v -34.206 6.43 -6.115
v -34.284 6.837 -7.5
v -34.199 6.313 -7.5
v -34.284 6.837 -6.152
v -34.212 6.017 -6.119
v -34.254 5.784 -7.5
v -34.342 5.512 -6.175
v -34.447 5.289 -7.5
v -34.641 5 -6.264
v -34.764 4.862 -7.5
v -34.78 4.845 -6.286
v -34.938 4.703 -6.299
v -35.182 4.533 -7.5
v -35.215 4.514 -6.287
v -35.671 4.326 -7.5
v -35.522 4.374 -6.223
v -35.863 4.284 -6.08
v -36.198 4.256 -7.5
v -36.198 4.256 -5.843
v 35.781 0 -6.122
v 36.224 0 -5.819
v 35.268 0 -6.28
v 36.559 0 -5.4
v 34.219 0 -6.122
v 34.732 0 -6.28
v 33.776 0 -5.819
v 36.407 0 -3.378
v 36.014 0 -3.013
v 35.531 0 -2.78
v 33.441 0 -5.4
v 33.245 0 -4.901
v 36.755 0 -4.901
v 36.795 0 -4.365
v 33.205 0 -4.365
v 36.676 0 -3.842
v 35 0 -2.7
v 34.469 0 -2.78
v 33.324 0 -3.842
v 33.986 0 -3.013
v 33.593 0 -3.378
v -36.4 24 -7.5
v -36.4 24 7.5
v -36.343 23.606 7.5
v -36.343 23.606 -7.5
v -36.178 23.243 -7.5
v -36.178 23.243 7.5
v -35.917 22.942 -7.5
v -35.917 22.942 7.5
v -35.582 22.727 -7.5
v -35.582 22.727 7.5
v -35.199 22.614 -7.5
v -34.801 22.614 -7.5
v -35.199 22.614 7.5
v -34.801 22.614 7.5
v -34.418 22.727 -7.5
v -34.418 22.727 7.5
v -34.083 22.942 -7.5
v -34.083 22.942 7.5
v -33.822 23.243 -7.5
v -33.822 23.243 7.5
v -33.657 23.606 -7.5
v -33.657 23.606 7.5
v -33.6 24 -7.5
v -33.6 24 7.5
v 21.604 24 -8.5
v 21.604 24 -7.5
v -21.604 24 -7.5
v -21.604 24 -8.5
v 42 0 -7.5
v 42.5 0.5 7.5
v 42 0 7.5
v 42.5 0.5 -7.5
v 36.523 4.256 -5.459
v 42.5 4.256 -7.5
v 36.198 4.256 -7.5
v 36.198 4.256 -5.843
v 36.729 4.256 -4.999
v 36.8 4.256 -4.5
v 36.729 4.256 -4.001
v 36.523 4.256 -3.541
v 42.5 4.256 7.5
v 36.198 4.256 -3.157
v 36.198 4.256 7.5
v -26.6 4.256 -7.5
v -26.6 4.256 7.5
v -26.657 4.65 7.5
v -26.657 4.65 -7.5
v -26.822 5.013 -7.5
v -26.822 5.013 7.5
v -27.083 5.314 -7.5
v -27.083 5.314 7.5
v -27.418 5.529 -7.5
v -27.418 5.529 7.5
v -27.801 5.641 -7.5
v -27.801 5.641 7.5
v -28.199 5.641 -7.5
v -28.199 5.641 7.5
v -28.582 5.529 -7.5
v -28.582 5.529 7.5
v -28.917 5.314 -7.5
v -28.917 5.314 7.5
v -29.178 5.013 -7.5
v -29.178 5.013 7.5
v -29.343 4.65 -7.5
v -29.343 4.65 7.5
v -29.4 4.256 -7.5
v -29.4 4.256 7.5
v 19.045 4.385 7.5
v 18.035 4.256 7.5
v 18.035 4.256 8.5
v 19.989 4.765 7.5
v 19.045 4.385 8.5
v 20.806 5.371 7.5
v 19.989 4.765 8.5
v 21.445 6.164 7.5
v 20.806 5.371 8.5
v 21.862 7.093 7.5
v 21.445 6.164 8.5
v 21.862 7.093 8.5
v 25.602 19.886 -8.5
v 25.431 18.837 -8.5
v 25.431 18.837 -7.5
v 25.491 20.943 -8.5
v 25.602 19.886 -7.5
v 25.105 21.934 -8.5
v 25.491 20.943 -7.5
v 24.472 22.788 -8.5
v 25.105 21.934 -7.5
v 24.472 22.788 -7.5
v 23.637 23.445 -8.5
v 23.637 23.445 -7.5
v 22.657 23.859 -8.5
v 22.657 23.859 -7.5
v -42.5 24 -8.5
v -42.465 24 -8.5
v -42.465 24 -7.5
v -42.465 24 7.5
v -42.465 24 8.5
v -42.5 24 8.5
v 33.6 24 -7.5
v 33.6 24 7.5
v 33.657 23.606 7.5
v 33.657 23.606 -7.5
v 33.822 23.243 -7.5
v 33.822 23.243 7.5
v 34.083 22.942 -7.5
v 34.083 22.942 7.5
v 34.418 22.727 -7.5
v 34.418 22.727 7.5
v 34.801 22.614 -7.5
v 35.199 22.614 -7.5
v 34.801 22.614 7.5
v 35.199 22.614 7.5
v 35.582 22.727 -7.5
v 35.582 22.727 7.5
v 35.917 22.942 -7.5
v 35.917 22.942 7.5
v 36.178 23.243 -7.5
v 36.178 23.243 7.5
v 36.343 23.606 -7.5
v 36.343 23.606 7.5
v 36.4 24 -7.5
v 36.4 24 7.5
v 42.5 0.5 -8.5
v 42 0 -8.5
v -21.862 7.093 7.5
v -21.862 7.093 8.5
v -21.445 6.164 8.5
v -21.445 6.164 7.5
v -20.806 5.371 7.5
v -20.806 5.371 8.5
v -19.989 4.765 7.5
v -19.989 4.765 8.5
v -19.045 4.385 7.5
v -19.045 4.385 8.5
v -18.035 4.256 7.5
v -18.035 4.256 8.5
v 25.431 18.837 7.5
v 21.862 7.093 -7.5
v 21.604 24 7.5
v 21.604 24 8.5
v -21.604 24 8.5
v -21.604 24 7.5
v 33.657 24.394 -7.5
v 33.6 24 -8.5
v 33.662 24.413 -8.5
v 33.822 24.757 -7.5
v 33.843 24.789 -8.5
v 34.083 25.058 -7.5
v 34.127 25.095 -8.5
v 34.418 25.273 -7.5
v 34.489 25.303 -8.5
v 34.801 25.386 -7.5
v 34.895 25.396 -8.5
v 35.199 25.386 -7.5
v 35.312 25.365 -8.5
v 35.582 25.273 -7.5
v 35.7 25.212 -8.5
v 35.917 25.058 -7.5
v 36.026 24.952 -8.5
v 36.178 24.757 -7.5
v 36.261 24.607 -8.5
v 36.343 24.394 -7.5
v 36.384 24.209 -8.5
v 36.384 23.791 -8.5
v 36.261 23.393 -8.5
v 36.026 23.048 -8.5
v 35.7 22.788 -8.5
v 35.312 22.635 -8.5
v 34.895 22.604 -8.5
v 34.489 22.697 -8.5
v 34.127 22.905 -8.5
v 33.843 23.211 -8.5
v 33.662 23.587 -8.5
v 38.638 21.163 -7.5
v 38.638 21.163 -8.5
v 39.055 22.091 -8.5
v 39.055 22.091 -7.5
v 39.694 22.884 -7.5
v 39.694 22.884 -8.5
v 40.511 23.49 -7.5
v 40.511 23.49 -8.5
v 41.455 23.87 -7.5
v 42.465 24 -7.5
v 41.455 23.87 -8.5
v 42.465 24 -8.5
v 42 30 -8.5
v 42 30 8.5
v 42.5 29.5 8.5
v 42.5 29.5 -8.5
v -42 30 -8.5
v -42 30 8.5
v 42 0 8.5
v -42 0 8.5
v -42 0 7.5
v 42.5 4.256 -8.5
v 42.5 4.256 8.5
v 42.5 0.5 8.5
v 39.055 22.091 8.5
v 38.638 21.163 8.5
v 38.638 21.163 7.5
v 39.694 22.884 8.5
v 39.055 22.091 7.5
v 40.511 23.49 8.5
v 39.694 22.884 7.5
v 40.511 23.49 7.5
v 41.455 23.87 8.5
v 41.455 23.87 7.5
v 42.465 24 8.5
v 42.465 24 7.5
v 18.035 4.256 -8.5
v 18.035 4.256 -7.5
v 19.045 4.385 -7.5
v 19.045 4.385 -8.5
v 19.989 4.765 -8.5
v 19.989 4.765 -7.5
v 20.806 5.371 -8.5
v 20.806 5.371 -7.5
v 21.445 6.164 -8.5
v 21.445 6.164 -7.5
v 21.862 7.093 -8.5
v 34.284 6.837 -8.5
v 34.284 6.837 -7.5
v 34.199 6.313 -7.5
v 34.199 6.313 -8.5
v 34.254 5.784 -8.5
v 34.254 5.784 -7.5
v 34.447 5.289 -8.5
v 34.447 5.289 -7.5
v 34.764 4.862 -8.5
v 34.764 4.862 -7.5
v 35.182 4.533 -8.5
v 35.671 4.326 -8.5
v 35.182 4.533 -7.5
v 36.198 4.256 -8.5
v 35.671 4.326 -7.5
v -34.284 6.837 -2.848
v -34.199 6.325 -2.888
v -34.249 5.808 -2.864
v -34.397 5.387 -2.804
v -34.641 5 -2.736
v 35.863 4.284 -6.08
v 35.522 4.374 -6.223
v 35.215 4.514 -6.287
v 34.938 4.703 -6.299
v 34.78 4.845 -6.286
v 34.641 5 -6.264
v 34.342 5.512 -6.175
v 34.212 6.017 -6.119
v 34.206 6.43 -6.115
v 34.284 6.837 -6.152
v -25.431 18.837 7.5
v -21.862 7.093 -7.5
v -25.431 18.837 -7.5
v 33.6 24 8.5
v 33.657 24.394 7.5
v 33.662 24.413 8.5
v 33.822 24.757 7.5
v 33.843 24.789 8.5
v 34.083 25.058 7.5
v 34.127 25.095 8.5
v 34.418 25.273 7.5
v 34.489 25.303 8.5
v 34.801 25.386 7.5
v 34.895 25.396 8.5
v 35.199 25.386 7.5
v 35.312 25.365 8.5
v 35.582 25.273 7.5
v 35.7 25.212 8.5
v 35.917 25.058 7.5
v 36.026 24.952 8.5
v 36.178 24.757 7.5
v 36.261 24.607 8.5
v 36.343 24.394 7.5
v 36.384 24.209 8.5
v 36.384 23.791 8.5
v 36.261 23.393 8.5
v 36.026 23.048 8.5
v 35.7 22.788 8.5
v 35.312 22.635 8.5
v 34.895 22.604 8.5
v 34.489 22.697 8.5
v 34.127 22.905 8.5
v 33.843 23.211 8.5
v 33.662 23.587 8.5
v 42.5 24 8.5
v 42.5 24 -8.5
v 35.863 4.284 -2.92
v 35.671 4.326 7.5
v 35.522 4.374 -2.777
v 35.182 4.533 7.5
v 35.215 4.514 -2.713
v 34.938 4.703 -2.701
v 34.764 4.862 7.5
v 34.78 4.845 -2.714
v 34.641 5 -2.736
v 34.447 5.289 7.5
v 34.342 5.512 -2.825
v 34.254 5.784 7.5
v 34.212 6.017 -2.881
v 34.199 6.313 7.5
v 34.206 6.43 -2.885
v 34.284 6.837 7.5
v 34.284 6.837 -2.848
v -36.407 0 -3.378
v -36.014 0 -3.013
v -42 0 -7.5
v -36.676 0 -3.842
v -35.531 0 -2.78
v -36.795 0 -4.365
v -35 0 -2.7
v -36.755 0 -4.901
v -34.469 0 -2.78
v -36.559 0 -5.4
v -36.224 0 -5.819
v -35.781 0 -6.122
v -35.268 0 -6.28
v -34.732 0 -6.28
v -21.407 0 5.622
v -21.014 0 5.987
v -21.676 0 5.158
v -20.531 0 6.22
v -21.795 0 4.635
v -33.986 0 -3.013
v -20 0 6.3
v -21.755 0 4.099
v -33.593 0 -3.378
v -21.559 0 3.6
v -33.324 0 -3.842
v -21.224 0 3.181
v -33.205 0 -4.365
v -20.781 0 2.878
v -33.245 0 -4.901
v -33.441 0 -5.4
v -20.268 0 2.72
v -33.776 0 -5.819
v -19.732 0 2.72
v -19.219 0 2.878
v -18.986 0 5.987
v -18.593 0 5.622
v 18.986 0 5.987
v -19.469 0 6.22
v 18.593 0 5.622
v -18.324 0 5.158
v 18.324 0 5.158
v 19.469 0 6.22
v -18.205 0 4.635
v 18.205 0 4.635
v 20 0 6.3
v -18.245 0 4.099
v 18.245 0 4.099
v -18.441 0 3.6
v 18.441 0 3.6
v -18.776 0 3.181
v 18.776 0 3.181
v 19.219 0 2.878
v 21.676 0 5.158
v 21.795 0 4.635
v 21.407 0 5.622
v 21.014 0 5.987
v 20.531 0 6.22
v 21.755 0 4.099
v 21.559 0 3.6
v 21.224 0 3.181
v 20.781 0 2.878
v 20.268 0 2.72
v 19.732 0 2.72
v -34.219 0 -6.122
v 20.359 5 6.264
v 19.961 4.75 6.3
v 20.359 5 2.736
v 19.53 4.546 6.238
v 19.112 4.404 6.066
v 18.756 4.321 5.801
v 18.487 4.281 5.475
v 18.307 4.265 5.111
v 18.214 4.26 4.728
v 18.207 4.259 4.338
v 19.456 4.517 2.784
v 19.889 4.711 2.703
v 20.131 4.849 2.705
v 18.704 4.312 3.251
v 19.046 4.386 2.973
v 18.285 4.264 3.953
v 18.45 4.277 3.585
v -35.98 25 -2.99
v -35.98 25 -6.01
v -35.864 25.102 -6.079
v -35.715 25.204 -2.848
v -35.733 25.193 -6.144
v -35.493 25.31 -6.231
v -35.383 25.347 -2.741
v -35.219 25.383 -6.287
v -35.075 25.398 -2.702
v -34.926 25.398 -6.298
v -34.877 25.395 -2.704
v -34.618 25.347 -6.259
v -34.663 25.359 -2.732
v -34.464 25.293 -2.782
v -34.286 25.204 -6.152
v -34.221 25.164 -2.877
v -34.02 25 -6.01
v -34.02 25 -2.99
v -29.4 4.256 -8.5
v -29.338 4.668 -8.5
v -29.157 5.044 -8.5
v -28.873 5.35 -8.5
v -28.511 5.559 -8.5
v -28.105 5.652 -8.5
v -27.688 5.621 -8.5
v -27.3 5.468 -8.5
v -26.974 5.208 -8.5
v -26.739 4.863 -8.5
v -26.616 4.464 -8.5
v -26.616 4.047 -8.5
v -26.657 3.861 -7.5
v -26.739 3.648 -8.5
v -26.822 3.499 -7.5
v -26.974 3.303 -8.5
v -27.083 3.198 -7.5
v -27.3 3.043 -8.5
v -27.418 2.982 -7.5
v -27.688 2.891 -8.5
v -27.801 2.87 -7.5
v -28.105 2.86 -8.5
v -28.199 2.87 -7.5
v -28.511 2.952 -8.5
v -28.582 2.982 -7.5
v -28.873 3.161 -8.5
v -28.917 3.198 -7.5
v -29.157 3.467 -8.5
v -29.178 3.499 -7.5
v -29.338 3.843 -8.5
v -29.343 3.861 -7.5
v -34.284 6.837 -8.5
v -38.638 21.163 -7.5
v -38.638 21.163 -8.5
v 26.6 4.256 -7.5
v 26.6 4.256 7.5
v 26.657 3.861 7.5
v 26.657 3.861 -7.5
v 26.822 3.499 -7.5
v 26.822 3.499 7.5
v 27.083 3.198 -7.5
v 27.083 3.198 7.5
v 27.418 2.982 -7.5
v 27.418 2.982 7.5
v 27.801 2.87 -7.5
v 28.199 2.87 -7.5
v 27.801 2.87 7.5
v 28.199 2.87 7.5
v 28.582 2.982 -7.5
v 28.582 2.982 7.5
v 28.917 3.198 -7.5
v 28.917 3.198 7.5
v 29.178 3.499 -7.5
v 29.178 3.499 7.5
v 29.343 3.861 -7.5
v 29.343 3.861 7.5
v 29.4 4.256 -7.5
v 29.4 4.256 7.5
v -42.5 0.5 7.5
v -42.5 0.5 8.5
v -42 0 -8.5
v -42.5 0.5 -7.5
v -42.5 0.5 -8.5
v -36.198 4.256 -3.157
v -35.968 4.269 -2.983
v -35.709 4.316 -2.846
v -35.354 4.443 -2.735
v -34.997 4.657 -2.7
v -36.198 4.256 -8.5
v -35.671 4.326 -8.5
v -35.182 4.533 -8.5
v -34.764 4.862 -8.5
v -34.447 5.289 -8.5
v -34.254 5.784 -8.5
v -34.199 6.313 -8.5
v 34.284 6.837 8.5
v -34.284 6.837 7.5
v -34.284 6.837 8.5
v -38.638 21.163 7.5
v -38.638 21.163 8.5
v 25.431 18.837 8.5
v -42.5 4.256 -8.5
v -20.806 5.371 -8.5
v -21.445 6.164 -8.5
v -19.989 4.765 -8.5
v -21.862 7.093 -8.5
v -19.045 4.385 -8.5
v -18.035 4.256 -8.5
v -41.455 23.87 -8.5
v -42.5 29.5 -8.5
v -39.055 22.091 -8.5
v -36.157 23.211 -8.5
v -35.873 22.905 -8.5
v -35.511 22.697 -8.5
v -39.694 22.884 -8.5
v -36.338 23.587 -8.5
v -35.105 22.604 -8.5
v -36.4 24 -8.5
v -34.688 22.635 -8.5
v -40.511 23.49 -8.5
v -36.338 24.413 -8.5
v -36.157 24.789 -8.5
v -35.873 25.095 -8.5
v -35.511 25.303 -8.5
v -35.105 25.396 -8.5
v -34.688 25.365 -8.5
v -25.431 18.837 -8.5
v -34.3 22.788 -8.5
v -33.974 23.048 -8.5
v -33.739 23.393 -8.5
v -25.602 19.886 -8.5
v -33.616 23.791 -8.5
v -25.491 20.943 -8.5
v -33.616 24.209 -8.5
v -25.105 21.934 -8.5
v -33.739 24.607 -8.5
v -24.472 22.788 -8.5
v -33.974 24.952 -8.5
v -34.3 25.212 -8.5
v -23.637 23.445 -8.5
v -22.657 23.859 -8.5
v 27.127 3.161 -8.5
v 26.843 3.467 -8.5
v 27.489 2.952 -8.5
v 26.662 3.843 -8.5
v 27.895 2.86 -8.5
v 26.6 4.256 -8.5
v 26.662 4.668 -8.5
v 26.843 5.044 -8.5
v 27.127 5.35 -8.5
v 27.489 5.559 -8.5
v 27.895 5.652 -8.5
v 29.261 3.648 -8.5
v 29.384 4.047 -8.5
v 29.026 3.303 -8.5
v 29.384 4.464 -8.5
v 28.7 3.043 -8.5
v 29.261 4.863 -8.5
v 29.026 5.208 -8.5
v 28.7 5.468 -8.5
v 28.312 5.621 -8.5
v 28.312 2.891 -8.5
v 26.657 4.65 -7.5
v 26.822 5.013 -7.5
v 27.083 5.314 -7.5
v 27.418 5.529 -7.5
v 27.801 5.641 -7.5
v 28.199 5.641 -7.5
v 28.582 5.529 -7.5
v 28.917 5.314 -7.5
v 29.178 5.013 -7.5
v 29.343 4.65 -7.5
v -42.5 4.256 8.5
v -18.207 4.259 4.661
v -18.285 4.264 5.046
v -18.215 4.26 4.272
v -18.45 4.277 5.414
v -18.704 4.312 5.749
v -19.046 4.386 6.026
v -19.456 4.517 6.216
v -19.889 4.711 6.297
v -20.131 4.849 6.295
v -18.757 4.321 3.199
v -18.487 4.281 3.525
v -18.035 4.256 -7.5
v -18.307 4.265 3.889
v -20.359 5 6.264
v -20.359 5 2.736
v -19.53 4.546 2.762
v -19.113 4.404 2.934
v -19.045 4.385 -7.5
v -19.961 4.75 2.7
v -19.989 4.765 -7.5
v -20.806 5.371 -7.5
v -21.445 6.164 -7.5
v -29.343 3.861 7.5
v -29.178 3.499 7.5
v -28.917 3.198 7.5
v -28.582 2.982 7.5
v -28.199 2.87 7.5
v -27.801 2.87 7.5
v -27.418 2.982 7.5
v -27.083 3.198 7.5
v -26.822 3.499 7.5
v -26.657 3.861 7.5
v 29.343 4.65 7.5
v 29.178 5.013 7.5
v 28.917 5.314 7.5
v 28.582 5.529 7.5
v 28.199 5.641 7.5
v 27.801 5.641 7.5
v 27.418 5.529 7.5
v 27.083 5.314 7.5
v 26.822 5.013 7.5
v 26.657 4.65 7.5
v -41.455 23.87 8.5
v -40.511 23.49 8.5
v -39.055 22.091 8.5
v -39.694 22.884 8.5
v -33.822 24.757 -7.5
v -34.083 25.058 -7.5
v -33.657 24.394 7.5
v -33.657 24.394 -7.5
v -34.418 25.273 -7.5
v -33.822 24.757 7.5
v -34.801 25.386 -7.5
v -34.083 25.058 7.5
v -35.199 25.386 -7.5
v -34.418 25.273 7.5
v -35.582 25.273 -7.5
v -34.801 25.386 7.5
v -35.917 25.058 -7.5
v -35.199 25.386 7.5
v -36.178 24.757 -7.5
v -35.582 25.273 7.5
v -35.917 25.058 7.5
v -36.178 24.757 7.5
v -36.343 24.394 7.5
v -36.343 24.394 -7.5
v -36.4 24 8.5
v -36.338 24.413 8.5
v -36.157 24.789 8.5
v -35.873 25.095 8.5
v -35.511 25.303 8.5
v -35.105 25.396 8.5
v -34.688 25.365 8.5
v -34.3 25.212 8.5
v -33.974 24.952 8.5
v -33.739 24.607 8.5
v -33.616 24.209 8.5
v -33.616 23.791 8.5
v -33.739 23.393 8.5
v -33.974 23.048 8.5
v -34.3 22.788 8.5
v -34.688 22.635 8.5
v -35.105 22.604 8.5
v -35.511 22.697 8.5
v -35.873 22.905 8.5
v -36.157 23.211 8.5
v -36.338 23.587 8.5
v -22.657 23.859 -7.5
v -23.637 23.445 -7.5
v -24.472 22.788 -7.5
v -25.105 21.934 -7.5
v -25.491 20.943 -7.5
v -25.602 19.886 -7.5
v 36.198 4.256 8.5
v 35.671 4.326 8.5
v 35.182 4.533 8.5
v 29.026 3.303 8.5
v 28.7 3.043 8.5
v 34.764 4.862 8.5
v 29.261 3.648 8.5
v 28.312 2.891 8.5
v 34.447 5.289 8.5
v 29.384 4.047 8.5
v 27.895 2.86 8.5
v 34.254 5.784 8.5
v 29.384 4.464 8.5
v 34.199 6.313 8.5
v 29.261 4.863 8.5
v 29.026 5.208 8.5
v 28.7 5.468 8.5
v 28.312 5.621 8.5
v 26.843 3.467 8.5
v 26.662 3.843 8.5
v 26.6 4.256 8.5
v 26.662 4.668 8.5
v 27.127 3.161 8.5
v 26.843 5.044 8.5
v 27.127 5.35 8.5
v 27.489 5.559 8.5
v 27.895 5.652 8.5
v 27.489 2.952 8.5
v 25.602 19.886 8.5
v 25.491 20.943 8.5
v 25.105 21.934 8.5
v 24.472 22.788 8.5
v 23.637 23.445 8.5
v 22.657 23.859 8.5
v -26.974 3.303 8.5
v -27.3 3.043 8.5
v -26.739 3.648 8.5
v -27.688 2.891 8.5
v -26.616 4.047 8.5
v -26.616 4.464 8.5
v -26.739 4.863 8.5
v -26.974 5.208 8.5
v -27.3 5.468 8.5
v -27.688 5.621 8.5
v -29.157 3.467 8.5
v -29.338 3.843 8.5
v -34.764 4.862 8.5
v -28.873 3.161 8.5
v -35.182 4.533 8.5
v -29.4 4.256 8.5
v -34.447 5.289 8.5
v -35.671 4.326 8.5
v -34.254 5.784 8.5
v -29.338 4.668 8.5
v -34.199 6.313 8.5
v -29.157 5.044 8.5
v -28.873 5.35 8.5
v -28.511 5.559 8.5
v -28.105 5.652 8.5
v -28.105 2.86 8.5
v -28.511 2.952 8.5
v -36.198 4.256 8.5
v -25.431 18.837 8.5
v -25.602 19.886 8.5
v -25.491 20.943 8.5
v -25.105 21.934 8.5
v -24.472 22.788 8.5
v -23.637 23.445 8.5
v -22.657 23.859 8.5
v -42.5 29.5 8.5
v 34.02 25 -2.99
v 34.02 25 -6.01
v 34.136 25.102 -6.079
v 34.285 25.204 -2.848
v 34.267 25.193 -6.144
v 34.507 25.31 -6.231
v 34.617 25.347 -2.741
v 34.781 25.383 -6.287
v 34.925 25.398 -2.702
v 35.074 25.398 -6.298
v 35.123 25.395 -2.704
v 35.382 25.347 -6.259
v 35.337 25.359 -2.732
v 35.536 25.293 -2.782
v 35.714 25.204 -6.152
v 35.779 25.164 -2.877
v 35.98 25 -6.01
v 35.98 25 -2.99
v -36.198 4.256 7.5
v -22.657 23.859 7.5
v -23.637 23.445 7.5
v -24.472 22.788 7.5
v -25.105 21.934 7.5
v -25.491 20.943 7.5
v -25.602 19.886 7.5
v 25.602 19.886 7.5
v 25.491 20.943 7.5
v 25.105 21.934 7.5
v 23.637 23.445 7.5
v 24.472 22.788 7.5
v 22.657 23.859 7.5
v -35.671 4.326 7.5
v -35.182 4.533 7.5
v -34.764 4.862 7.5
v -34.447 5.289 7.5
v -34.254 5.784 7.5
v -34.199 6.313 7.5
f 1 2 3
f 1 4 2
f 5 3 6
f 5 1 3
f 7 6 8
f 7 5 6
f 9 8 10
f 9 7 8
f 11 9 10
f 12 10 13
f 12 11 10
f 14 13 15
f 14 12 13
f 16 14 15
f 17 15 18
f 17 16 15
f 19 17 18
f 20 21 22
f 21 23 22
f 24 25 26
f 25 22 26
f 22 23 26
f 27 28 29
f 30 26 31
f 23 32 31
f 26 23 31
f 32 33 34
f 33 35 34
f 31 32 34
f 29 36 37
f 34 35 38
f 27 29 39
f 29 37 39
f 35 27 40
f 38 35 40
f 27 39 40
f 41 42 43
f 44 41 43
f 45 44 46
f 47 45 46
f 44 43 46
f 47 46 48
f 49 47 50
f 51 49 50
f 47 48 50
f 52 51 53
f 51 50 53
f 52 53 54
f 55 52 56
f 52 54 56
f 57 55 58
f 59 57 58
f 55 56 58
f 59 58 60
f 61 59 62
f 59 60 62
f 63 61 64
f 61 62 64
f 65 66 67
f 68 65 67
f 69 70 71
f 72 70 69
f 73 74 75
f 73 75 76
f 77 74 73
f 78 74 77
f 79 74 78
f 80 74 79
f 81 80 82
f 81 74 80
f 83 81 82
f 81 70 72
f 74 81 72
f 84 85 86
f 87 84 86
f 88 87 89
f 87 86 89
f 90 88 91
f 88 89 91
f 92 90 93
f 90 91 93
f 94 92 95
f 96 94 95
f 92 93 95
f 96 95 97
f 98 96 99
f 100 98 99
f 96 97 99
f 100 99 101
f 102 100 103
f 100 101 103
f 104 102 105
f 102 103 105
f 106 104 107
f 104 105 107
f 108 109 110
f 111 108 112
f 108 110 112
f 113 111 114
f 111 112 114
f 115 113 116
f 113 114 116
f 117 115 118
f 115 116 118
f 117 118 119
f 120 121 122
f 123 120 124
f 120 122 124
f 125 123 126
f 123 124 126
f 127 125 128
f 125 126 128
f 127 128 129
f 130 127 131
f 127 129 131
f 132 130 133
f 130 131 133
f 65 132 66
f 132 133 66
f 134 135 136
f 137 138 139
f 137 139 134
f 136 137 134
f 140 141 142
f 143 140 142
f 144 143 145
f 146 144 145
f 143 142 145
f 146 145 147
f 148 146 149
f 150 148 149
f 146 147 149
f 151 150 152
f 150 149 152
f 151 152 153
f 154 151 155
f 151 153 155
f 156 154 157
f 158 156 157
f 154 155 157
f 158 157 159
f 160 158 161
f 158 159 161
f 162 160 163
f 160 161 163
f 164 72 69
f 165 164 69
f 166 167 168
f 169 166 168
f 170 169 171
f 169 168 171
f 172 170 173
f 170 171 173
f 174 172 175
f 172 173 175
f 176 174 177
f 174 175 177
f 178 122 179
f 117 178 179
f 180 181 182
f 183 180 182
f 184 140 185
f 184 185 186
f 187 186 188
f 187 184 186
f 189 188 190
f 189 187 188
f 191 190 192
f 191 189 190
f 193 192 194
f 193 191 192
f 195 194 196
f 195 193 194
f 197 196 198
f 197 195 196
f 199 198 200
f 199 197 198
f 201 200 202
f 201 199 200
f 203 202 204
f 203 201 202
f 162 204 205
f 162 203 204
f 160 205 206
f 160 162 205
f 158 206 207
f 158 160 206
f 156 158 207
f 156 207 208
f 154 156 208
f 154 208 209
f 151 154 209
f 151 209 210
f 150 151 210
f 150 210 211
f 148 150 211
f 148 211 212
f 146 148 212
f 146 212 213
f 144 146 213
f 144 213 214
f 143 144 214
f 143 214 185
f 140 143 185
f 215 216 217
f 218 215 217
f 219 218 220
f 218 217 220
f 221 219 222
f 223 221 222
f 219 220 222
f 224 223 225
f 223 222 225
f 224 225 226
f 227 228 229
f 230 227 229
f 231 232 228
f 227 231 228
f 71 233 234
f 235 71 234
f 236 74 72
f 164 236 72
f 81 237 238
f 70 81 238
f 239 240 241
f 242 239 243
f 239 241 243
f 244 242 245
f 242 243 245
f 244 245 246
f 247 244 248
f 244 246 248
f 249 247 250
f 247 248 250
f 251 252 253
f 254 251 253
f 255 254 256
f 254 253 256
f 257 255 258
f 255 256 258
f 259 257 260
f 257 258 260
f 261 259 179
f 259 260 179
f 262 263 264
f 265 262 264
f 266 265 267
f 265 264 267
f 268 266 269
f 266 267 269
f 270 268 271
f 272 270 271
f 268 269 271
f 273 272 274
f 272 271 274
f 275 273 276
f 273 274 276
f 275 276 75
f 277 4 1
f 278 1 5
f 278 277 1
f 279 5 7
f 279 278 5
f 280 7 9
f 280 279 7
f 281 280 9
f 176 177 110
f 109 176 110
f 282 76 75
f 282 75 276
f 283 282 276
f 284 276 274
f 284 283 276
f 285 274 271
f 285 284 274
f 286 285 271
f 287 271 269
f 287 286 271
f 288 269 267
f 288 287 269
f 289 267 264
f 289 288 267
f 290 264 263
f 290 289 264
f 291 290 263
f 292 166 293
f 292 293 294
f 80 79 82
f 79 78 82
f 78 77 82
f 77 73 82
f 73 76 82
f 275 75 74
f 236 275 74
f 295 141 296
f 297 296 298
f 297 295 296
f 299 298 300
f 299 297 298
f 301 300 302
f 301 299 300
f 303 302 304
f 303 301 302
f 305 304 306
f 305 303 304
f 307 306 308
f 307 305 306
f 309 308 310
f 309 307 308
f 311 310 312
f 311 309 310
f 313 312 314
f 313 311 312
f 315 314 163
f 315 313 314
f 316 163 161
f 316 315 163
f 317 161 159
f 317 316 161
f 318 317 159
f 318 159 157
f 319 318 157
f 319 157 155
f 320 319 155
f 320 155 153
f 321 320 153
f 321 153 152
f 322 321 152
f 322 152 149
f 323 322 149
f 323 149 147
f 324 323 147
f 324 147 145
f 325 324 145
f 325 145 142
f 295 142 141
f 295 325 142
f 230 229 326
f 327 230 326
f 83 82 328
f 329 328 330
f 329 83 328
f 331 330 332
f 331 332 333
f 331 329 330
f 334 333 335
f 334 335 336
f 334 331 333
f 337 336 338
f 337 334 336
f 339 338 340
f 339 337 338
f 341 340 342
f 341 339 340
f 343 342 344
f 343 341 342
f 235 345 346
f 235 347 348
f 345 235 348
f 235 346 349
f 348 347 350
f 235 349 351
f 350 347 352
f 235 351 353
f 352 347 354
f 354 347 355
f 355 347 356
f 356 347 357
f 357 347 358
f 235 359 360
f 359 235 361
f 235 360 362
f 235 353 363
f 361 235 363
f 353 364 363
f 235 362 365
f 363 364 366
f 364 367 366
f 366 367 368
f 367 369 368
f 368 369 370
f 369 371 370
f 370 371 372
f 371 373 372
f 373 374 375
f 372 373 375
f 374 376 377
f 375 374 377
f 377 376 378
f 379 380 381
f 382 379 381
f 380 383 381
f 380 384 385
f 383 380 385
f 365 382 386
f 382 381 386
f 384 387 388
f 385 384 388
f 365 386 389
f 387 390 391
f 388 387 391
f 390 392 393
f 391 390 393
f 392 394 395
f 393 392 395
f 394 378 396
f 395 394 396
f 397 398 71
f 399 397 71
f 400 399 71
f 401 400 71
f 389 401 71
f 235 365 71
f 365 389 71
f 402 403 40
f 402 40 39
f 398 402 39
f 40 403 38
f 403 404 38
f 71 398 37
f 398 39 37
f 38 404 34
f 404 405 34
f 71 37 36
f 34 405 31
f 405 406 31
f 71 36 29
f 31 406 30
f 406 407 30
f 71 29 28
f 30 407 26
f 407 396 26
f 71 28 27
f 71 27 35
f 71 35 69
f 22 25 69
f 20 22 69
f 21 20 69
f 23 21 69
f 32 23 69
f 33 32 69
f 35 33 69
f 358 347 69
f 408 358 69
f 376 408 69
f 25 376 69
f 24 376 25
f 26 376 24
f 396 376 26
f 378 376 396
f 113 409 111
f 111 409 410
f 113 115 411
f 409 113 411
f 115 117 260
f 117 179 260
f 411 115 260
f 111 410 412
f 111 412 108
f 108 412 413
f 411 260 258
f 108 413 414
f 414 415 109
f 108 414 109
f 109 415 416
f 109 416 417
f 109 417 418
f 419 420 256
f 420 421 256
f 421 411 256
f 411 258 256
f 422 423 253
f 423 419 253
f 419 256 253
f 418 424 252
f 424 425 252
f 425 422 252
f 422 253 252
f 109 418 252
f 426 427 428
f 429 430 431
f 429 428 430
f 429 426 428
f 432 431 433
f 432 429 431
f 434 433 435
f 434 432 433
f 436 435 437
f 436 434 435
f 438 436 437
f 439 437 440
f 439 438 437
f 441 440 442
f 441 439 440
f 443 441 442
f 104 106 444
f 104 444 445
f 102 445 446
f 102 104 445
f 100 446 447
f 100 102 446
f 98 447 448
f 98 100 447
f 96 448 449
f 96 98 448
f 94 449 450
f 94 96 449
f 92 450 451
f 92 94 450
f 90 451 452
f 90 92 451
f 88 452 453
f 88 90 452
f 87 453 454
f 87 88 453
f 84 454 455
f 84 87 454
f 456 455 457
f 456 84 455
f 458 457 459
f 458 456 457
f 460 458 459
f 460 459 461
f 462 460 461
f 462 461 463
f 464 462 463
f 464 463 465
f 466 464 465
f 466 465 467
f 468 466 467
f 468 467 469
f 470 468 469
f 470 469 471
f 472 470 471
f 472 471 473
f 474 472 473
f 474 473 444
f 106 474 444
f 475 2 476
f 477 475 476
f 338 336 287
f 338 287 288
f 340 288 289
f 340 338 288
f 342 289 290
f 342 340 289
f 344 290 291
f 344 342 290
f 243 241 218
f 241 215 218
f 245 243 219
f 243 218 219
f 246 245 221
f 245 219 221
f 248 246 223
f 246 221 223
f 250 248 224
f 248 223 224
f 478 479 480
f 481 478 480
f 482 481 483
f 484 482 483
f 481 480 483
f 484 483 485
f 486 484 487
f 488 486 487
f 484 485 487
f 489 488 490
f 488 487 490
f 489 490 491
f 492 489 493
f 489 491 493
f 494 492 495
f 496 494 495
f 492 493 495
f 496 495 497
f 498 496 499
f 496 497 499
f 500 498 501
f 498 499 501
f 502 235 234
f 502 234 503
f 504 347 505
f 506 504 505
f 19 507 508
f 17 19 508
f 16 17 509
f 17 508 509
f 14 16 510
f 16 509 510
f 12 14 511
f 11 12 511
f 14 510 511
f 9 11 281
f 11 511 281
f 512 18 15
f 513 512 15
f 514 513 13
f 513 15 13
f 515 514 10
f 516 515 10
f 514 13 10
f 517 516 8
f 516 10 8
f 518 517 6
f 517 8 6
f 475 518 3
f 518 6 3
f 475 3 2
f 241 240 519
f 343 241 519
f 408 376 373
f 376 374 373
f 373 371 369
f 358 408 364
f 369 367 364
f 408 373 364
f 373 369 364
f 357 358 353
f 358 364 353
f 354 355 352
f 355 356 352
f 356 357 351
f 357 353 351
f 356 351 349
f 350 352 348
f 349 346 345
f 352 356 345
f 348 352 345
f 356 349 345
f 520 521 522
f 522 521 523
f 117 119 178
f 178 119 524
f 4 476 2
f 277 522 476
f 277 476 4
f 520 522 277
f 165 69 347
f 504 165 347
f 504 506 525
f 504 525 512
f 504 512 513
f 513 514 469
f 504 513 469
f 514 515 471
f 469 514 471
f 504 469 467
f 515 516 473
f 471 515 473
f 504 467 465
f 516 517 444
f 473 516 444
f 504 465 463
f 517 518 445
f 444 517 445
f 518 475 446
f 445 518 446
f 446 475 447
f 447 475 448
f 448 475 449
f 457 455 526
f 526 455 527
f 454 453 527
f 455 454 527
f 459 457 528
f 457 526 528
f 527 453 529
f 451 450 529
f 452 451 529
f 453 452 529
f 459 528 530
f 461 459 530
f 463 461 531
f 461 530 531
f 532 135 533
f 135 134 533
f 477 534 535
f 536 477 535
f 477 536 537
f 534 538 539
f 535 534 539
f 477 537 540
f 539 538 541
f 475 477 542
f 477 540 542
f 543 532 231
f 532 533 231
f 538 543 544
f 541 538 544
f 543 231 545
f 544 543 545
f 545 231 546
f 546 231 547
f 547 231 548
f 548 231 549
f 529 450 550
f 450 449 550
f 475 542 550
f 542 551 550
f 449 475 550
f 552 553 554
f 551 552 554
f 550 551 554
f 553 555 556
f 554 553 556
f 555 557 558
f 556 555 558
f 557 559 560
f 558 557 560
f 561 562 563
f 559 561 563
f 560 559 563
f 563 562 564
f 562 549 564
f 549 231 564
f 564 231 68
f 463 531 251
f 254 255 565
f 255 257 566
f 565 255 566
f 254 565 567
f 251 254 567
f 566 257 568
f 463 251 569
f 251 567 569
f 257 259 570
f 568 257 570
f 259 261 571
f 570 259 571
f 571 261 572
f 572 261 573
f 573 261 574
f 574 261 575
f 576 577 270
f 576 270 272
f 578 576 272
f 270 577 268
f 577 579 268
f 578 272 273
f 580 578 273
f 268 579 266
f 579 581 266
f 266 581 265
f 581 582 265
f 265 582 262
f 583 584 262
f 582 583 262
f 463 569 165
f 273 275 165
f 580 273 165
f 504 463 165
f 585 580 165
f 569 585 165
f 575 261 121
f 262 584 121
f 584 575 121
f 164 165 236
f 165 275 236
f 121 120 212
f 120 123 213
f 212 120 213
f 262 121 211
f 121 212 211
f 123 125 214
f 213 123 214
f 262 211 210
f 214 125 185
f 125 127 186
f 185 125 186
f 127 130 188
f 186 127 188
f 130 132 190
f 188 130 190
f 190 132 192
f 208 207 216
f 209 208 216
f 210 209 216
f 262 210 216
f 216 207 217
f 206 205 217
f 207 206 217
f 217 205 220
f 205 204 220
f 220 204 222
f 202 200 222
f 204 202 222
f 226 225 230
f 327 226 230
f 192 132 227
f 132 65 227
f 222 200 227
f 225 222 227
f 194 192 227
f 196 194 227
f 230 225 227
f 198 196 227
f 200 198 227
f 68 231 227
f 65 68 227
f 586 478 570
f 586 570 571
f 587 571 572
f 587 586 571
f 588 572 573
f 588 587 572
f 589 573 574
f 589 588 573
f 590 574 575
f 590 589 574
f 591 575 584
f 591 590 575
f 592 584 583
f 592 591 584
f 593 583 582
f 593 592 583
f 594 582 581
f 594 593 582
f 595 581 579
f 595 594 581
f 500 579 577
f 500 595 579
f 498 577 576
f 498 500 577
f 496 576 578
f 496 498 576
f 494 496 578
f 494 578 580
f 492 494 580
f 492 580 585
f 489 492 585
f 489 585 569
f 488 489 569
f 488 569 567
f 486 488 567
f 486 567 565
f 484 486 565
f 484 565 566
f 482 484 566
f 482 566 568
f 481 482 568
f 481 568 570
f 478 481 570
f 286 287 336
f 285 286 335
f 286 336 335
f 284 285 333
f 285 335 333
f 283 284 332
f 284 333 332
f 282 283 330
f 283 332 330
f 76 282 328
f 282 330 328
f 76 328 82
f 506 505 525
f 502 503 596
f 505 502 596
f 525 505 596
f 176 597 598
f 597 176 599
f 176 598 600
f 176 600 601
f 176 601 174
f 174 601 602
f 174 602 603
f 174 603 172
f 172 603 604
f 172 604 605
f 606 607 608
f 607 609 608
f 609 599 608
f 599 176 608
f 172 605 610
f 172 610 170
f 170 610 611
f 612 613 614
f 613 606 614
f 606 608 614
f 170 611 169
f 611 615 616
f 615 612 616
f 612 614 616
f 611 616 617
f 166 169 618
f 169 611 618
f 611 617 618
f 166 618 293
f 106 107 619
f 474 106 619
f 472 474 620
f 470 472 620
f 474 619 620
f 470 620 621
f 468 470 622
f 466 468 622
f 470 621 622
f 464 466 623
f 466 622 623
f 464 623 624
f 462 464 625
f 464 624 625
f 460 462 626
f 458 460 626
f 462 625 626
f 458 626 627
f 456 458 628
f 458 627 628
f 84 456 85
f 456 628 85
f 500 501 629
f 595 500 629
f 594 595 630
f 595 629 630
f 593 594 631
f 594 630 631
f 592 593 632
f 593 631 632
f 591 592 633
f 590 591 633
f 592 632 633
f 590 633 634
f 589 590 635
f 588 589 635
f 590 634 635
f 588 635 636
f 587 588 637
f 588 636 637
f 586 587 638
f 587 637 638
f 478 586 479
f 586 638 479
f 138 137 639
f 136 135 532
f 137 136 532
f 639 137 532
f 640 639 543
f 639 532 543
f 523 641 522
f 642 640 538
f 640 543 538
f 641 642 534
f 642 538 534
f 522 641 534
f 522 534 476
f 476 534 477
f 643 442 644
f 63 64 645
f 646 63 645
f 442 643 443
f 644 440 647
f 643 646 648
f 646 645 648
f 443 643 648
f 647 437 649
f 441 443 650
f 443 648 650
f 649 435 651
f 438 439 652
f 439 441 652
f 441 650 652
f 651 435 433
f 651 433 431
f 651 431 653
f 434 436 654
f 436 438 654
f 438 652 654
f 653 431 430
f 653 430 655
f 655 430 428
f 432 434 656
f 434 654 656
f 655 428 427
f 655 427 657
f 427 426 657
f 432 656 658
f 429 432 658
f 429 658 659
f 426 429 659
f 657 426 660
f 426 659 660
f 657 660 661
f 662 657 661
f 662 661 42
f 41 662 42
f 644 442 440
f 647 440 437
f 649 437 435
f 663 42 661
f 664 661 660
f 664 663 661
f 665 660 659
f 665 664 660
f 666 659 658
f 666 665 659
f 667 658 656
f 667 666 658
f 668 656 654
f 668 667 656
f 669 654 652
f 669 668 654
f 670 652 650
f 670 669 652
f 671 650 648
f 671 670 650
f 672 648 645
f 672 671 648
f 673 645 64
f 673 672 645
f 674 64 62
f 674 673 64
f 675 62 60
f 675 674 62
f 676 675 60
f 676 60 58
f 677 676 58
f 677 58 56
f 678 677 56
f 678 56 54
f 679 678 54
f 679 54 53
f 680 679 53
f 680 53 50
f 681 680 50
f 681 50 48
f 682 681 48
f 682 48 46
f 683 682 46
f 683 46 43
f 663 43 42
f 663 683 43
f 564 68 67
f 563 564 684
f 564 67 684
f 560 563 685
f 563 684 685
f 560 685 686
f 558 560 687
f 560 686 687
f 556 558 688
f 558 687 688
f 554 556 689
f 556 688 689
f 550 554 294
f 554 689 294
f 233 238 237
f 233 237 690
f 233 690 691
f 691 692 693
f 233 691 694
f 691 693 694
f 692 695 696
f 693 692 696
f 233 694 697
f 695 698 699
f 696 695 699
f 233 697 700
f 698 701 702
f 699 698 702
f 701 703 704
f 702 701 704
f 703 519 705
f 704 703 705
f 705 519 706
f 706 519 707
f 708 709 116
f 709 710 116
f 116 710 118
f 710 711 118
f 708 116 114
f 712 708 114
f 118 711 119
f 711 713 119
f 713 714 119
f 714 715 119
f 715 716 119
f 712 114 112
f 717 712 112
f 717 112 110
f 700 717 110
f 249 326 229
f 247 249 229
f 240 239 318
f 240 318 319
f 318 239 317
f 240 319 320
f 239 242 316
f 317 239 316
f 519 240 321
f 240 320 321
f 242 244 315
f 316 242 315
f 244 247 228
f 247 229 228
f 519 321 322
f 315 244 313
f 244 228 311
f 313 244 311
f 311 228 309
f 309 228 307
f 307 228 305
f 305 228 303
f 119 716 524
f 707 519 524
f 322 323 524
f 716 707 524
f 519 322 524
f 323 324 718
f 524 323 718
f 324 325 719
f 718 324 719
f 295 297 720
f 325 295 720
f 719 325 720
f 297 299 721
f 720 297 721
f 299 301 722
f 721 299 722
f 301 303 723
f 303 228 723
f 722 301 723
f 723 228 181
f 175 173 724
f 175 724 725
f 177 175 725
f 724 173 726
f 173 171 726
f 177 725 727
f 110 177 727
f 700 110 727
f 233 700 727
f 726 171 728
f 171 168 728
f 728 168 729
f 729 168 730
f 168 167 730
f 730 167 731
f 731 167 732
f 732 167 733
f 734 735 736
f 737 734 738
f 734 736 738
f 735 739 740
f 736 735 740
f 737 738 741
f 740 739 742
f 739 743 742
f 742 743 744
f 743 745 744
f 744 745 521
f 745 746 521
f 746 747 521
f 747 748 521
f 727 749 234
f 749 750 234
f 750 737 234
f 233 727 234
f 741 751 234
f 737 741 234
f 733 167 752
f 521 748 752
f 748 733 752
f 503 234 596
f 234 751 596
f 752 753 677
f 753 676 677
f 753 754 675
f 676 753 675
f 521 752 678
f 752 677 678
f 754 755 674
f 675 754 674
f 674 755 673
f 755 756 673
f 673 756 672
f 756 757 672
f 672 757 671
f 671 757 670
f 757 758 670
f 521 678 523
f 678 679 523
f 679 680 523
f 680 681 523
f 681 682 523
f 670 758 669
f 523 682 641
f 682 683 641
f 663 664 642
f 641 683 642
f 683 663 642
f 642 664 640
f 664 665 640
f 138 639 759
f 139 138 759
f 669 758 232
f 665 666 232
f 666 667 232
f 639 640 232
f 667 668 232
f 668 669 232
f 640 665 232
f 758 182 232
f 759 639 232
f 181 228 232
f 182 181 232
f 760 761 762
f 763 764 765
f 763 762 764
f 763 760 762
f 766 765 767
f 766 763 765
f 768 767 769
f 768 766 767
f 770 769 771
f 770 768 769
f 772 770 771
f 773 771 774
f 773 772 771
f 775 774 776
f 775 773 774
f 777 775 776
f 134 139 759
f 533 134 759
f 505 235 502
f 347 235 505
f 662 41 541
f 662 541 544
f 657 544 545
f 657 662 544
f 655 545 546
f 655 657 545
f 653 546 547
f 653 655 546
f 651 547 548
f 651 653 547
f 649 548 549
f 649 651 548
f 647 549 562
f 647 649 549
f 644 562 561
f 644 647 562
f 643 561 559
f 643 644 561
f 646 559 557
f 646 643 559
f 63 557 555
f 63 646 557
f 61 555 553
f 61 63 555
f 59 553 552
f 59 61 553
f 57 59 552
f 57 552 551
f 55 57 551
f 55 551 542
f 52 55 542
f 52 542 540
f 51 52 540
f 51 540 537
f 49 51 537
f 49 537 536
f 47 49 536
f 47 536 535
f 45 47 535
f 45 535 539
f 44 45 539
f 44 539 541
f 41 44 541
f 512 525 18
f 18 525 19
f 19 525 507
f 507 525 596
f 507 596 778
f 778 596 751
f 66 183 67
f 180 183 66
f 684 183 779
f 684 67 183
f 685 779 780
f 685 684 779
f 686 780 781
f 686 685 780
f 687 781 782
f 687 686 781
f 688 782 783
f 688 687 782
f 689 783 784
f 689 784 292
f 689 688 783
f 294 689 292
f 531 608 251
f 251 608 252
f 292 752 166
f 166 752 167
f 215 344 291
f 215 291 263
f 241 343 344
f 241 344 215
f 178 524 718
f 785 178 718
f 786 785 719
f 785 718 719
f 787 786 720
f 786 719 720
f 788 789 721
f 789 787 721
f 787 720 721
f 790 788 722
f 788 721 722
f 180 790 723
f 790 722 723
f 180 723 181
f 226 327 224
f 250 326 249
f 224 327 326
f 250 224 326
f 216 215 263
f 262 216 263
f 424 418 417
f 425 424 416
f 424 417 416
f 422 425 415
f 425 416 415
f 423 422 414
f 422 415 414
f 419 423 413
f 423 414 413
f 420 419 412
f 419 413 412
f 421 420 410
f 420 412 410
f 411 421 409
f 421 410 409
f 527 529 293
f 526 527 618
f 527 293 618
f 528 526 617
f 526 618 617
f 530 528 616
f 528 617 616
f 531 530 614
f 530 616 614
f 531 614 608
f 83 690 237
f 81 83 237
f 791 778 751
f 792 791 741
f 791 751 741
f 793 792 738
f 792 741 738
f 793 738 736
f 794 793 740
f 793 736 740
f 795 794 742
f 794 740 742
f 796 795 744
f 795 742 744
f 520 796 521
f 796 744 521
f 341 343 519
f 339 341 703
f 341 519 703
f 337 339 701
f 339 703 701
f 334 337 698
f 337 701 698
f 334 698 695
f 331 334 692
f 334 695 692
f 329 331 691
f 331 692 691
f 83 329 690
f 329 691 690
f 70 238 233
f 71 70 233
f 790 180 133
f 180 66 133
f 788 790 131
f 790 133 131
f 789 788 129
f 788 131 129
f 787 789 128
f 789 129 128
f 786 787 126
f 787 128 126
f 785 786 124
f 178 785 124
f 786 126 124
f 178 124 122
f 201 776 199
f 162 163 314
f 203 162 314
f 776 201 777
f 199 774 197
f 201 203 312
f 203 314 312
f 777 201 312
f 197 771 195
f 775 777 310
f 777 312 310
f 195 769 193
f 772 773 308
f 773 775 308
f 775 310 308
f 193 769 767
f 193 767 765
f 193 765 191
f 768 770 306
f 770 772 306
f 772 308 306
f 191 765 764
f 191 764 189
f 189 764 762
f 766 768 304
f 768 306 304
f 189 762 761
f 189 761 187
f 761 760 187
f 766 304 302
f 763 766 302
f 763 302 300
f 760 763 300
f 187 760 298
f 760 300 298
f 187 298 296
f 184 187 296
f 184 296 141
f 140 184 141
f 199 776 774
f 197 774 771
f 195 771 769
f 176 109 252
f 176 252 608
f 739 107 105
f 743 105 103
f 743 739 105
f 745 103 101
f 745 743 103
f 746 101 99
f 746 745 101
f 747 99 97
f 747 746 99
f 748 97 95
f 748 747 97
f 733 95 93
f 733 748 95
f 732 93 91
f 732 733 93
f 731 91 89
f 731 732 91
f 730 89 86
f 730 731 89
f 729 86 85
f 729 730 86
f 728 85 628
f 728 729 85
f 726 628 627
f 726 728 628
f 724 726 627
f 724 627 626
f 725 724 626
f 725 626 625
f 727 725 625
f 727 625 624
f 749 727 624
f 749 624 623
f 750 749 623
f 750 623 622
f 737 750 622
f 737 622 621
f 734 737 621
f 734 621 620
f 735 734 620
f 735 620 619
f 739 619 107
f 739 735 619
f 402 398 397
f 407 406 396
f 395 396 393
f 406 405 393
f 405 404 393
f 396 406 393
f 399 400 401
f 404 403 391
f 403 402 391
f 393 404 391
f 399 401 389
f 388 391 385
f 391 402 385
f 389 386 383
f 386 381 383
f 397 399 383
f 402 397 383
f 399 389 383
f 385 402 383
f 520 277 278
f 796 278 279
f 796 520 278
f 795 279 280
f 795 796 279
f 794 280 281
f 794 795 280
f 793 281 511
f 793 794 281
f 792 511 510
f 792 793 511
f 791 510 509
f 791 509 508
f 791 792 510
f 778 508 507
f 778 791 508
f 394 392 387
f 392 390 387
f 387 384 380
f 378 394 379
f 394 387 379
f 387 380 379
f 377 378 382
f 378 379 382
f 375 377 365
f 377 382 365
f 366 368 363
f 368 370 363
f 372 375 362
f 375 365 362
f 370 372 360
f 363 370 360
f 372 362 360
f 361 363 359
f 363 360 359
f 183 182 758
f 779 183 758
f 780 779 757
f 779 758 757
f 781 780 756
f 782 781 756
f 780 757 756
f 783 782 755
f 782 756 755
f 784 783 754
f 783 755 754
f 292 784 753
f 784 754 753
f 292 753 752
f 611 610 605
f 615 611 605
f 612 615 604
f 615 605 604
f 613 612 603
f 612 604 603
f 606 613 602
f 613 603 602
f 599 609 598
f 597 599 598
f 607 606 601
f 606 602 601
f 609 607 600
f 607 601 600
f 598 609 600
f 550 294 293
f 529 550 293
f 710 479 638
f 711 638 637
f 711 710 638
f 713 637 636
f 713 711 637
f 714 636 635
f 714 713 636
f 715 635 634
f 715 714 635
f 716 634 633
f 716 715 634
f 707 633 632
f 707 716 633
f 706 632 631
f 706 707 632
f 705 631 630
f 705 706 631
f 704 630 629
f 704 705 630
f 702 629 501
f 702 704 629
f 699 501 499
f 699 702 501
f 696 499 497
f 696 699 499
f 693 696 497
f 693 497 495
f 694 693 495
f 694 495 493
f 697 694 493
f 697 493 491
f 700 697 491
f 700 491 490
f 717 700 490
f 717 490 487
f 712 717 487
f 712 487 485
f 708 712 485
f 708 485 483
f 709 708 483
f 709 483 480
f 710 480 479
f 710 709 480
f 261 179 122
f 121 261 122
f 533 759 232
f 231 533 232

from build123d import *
from build123d.topology import SkipClean

# Parameters (mm, degrees)
SKETCH_1_W           = 85
SKETCH_1_H           = 15
EXTRUDE_1_DEPTH      = 30
SKETCH_2_R           = 1.4
CUT_EXTRUDE_1_DEPTH  = 40
CUT_EXTRUDE_2_DEPTH  = 40
FILLET_1_R           = 4
SKETCH_5_R           = 1.8
CUT_EXTRUDE_3_DEPTH  = 5
CHAMFER_1_SIZE       = 0.5
CUT_EXTRUDE_4_DEPTH  = 24
FILLET_3_R           = 4
CUT_EXTRUDE_START    = -5
SKETCH_9_R           = 1.8
CUT_EXTRUDE_5_DEPTH  = 5
FILLET_4_R           = 2
EXTRUDE_3_DEPTH      = 1
EXTRUDE_3_DEPTH_BACK = 16
SKETCH_10_R          = 1.4
FILLET_START         = -8.5
FILLET_5_DEPTH       = 17


with BuildPart() as part:
    # 草图1 → 凸台-拉伸1 (new body)
    with BuildSketch(Plane(origin=(0, 0, 0), x_dir=(1, 0, 0), z_dir=(0, 1, 0))):
        Rectangle(SKETCH_1_W, SKETCH_1_H)
    extrude(amount=EXTRUDE_1_DEPTH)

    # 草图2 → 切除-拉伸1 (cut)
    with BuildSketch(Plane.XY.offset(7.5)):
        with Locations((-35, 24)):
            Circle(SKETCH_2_R)
        with Locations((35, 24)):
            Circle(SKETCH_2_R)
        with Locations((28, 4.255699158)):
            Circle(SKETCH_2_R)
        with Locations((-28, 4.255699158)):
            Circle(SKETCH_2_R)
    extrude(amount=-CUT_EXTRUDE_1_DEPTH, mode=Mode.SUBTRACT)

    # 草图3 → 切除-拉伸2 (cut)
    with BuildSketch(Plane.XY.offset(7.5)):
        Polygon((-27, 24), (27, 24), (21, 4.255699158), (-21, 4.255699158), align=None)
    extrude(amount=-CUT_EXTRUDE_2_DEPTH, mode=Mode.SUBTRACT)

    # 圆角1
    fillet_1_edges = [part.edges().sort_by_distance(p)[0] for p in [
        (-21, 4.255699158, 0),
        (-27, 24, 0),
        (27, 24, 0),
        (21, 4.255699158, 0),
    ]]
    fillet(fillet_1_edges, radius=FILLET_1_R)

    # 草图5 → 切除-拉伸3 (cut)
    with BuildSketch(Plane(origin=(0, 30, 0), x_dir=(1, 0, 0), z_dir=(0, 1, 0))):
        with Locations(Location((-35, 4.5, 0), (0, 0, 270))):
            Circle(SKETCH_5_R)
        with Locations(Location((35, 4.5, 0), (0, 0, 270))):
            Circle(SKETCH_5_R)
        with Locations(Location((-20, -4.5, 0), (0, 0, 270))):
            Circle(SKETCH_5_R)
        with Locations(Location((20, -4.5, 0), (0, 0, 270))):
            Circle(SKETCH_5_R)
    extrude(amount=-CUT_EXTRUDE_3_DEPTH, mode=Mode.SUBTRACT)

    # 倒角1
    chamfer_1_edges = [part.edges().sort_by_distance(p)[0] for p in [
        (-42.5, 30, 0),
        (42.5, 30, 0),
        (-42.5, 0, 0),
        (42.5, 0, 0),
    ]]
    chamfer(chamfer_1_edges, length=CHAMFER_1_SIZE)

    # 草图6 → 切除-拉伸4 (cut)
    with BuildSketch(Plane.XY.offset(7.5)):
        Polygon((-42.5, 24), (-39.5, 24), (-33.5, 4.255699158), (-42.5, 4.255699158), align=None)
        Polygon((42.5, 24), (42.5, 4.255699158), (33.5, 4.255699158), (39.5, 24), align=None)
    extrude(amount=-CUT_EXTRUDE_4_DEPTH, mode=Mode.SUBTRACT)

    # 圆角3
    fillet_3_edges = [part.edges().sort_by_distance(p)[0] for p in [
        (-39.5, 24, 0),
        (39.5, 24, 0),
    ]]
    fillet(fillet_3_edges, radius=FILLET_3_R)

    # 草图9 → 切除-拉伸5 (cut)
    with BuildSketch(Plane.XZ.offset(CUT_EXTRUDE_START)):
        with Locations(Location((20, 4.5, 0), (0, 0, 90))):
            Circle(SKETCH_9_R)
        with Locations(Location((-20, 4.5, 0), (0, 0, 90))):
            Circle(SKETCH_9_R)
        with Locations(Location((-35, -4.5, 0), (0, 0, 90))):
            Circle(SKETCH_9_R)
        with Locations(Location((35, -4.5, 0), (0, 0, 90))):
            Circle(SKETCH_9_R)
    extrude(amount=CUT_EXTRUDE_5_DEPTH, mode=Mode.SUBTRACT)

    # 圆角4
    # the kernel refuses this fillet: 2 mm, written as the material it adds along each edge
    with BuildSketch(Plane(origin=(-33.5, 4.255699158, 7.5), x_dir=(-1, 0, 0), z_dir=(0, 0, -1))) as fillet_4_piece_1_section:
        with BuildLine():
            CenterArc((FILLET_4_R * 1.34903882702, FILLET_4_R), FILLET_4_R, 163.096751643, 106.903248357)
            Line((FILLET_4_R * 0.392241725729, FILLET_4_R * 1.29075643923), (0, 0))
            Line((0, 0), (FILLET_4_R * 1.34903882702, 0))
        make_face()
    fillet_4_piece_1 = extrude(amount=17.750206698, mode=Mode.PRIVATE)
    fillet_4_piece_1 = split(fillet_4_piece_1, bisect_by=Plane(origin=(-33.5, 4.255699158, -7.5), z_dir=(0, 0, 1)), keep=Keep.TOP, mode=Mode.PRIVATE)
    fillet_4_piece_1 = fillet_4_piece_1 - Plane(origin=(-35, 4.255699158, -4.5), x_dir=(0, 0, 1), z_dir=(0, 1, 0)) * Cylinder(1.8, 47, mode=Mode.PRIVATE)
    add(fillet_4_piece_1)
    with BuildSketch(Plane(origin=(-33.5, 4.255699158, 7.5), x_dir=(-1, 0, 0), z_dir=(0, 0, -1))) as fillet_4_piece_2_section:
        with BuildLine():
            CenterArc((FILLET_4_R * 1.34903882702, FILLET_4_R), FILLET_4_R, 163.096751643, 106.903248357)
            Line((FILLET_4_R * 0.392241725729, FILLET_4_R * 1.29075643923), (0, 0))
            Line((0, 0), (FILLET_4_R * 1.34903882702, 0))
        make_face()
    fillet_4_piece_2 = extrude(amount=17.750206698, mode=Mode.PRIVATE)
    fillet_4_piece_2 = split(fillet_4_piece_2, bisect_by=Plane(origin=(-33.5, 4.255699158, -7.5), z_dir=(0, 0, 1)), keep=Keep.TOP, mode=Mode.PRIVATE)
    fillet_4_piece_2 = split(fillet_4_piece_2, bisect_by=Plane(origin=(-33.5, 5, 7.5), z_dir=(0, 1, 0)), keep=Keep.TOP, mode=Mode.PRIVATE)
    add(fillet_4_piece_2)
    with BuildSketch(Plane(origin=(33.5, 4.255699158, 7.5), x_dir=(0.2907564392301515, 0.9567971012948373, 0), z_dir=(0, 0, -1))) as fillet_4_piece_3_section:
        with BuildLine():
            CenterArc((FILLET_4_R * 1.34903882702, FILLET_4_R), FILLET_4_R, 163.096751643, 106.903248357)
            Line((FILLET_4_R * 0.392241725729, FILLET_4_R * 1.29075643923), (0, 0))
            Line((0, 0), (FILLET_4_R * 1.34903882702, 0))
        make_face()
    fillet_4_piece_3 = extrude(amount=17.750206698, mode=Mode.PRIVATE)
    fillet_4_piece_3 = split(fillet_4_piece_3, bisect_by=Plane(origin=(33.5, 4.255699158, -7.5), z_dir=(0, 0, 1)), keep=Keep.TOP, mode=Mode.PRIVATE)
    fillet_4_piece_3 = fillet_4_piece_3 - Plane(origin=(35, 4.255699158, -4.5), x_dir=(0, 0, 1), z_dir=(0, 1, 0)) * Cylinder(1.8, 47, mode=Mode.PRIVATE)
    add(fillet_4_piece_3)
    with BuildSketch(Plane(origin=(33.5, 4.255699158, 7.5), x_dir=(0.2907564392301515, 0.9567971012948373, 0), z_dir=(0, 0, -1))) as fillet_4_piece_4_section:
        with BuildLine():
            CenterArc((FILLET_4_R * 1.34903882702, FILLET_4_R), FILLET_4_R, 163.096751643, 106.903248357)
            Line((FILLET_4_R * 0.392241725729, FILLET_4_R * 1.29075643923), (0, 0))
            Line((0, 0), (FILLET_4_R * 1.34903882702, 0))
        make_face()
    fillet_4_piece_4 = extrude(amount=17.750206698, mode=Mode.PRIVATE)
    fillet_4_piece_4 = split(fillet_4_piece_4, bisect_by=Plane(origin=(33.5, 4.255699158, -7.5), z_dir=(0, 0, 1)), keep=Keep.TOP, mode=Mode.PRIVATE)
    fillet_4_piece_4 = split(fillet_4_piece_4, bisect_by=Plane(origin=(33.5, 5, 7.5), z_dir=(0, 1, 0)), keep=Keep.TOP, mode=Mode.PRIVATE)
    add(fillet_4_piece_4)

    # 草图10 → 凸台-拉伸3 (add, two sides: drawn at the far end of the back side and taken through both)
    with SkipClean():  # the faces are left unmerged after this step: merging them gives an invalid solid
        with BuildSketch(Plane(origin=(0, 0, -7.5), x_dir=(-1, 0, 0), z_dir=(0, 0, -1)).offset(-EXTRUDE_3_DEPTH_BACK)):
            with BuildLine():
                Line((42.5, 29.5), (42, 30))
                Line((42, 30), (-42, 30))
                Line((-42, 30), (-42.5, 29.5))
                Line((-42.5, 29.5), (-42.5, 24))
                Line((-42.5, 24), (-39.5, 24))
                Line((-39.5, 24), (-38.637885631, 21.163025757))
                Line((-38.637885631, 21.163025757), (-34.284483451, 6.837212037))
                ThreePointArc((-34.284483451, 6.837212037), (-34.591368944, 5.064696589), (-36.198077654, 4.255699158))
                Line((-36.198077654, 4.255699158), (-42.5, 4.255699158))
                Line((-42.5, 4.255699158), (-42.5, 0.5))
                Line((-42.5, 0.5), (-42, 0))
                Line((-42, 0), (42, 0))
                Line((42, 0), (42.5, 0.5))
                Line((42.5, 0.5), (42.5, 4.255699158))
                Line((42.5, 4.255699158), (36.198077654, 4.255699158))
                ThreePointArc((36.198077654, 4.255699158), (34.591368944, 5.064696589), (34.284483451, 6.837212037))
                Line((34.284483451, 6.837212037), (38.637885631, 21.163025757))
                Line((38.637885631, 21.163025757), (39.5, 24))
                Line((39.5, 24), (42.5, 24))
                Line((42.5, 24), (42.5, 29.5))
            make_face()
            with Locations((-28, 4.255699158)):
                Circle(SKETCH_10_R, mode=Mode.SUBTRACT)
            with Locations((28, 4.255699158)):
                Circle(SKETCH_10_R, mode=Mode.SUBTRACT)
            with BuildLine():
                Line((-21.603844692, 24), (21.603844692, 24))
                ThreePointArc((21.603844692, 24), (24.817262112, 22.38200514), (25.431033097, 18.836974243))
                Line((25.431033097, 18.836974243), (21.862114369, 7.092673402))
                ThreePointArc((21.862114369, 7.092673402), (20.416931104, 5.042281739), (18.034925964, 4.255699158))
                Line((18.034925964, 4.255699158), (-18.034925964, 4.255699158))
                ThreePointArc((-18.034925964, 4.255699158), (-20.416931104, 5.042281739), (-21.862114369, 7.092673402))
                Line((-21.862114369, 7.092673402), (-25.431033097, 18.836974243))
                ThreePointArc((-25.431033097, 18.836974243), (-24.817262112, 22.38200514), (-21.603844692, 24))
            make_face(mode=Mode.SUBTRACT)
            with Locations((-35, 24)):
                Circle(SKETCH_10_R, mode=Mode.SUBTRACT)
            with Locations((35, 24)):
                Circle(SKETCH_10_R, mode=Mode.SUBTRACT)
        extrude(amount=EXTRUDE_3_DEPTH + EXTRUDE_3_DEPTH_BACK)
    add(part.part.scale(1), mode=Mode.REPLACE)  # the faces are merged on a copy

    # 圆角5: read off the stored shape, not the designer's step
    # 圆角5 outline → 圆角5 (add)
    with BuildSketch(Plane.XY.offset(FILLET_START)):
        with BuildLine():
            ThreePointArc((-42.465074036, 24), (-40.083068896, 23.21341742), (-38.637885631, 21.163025757))
            Line((-38.637885631, 21.163025757), (-39.5, 24))
            Line((-39.5, 24), (-42.465074036, 24))
        make_face()
        with BuildLine():
            ThreePointArc((38.637885631, 21.163025757), (40.083068896, 23.21341742), (42.465074036, 24))
            Line((42.465074036, 24), (39.5, 24))
            Line((39.5, 24), (38.637885631, 21.163025757))
        make_face()
    extrude(amount=FILLET_5_DEPTH)


solid = part.part
